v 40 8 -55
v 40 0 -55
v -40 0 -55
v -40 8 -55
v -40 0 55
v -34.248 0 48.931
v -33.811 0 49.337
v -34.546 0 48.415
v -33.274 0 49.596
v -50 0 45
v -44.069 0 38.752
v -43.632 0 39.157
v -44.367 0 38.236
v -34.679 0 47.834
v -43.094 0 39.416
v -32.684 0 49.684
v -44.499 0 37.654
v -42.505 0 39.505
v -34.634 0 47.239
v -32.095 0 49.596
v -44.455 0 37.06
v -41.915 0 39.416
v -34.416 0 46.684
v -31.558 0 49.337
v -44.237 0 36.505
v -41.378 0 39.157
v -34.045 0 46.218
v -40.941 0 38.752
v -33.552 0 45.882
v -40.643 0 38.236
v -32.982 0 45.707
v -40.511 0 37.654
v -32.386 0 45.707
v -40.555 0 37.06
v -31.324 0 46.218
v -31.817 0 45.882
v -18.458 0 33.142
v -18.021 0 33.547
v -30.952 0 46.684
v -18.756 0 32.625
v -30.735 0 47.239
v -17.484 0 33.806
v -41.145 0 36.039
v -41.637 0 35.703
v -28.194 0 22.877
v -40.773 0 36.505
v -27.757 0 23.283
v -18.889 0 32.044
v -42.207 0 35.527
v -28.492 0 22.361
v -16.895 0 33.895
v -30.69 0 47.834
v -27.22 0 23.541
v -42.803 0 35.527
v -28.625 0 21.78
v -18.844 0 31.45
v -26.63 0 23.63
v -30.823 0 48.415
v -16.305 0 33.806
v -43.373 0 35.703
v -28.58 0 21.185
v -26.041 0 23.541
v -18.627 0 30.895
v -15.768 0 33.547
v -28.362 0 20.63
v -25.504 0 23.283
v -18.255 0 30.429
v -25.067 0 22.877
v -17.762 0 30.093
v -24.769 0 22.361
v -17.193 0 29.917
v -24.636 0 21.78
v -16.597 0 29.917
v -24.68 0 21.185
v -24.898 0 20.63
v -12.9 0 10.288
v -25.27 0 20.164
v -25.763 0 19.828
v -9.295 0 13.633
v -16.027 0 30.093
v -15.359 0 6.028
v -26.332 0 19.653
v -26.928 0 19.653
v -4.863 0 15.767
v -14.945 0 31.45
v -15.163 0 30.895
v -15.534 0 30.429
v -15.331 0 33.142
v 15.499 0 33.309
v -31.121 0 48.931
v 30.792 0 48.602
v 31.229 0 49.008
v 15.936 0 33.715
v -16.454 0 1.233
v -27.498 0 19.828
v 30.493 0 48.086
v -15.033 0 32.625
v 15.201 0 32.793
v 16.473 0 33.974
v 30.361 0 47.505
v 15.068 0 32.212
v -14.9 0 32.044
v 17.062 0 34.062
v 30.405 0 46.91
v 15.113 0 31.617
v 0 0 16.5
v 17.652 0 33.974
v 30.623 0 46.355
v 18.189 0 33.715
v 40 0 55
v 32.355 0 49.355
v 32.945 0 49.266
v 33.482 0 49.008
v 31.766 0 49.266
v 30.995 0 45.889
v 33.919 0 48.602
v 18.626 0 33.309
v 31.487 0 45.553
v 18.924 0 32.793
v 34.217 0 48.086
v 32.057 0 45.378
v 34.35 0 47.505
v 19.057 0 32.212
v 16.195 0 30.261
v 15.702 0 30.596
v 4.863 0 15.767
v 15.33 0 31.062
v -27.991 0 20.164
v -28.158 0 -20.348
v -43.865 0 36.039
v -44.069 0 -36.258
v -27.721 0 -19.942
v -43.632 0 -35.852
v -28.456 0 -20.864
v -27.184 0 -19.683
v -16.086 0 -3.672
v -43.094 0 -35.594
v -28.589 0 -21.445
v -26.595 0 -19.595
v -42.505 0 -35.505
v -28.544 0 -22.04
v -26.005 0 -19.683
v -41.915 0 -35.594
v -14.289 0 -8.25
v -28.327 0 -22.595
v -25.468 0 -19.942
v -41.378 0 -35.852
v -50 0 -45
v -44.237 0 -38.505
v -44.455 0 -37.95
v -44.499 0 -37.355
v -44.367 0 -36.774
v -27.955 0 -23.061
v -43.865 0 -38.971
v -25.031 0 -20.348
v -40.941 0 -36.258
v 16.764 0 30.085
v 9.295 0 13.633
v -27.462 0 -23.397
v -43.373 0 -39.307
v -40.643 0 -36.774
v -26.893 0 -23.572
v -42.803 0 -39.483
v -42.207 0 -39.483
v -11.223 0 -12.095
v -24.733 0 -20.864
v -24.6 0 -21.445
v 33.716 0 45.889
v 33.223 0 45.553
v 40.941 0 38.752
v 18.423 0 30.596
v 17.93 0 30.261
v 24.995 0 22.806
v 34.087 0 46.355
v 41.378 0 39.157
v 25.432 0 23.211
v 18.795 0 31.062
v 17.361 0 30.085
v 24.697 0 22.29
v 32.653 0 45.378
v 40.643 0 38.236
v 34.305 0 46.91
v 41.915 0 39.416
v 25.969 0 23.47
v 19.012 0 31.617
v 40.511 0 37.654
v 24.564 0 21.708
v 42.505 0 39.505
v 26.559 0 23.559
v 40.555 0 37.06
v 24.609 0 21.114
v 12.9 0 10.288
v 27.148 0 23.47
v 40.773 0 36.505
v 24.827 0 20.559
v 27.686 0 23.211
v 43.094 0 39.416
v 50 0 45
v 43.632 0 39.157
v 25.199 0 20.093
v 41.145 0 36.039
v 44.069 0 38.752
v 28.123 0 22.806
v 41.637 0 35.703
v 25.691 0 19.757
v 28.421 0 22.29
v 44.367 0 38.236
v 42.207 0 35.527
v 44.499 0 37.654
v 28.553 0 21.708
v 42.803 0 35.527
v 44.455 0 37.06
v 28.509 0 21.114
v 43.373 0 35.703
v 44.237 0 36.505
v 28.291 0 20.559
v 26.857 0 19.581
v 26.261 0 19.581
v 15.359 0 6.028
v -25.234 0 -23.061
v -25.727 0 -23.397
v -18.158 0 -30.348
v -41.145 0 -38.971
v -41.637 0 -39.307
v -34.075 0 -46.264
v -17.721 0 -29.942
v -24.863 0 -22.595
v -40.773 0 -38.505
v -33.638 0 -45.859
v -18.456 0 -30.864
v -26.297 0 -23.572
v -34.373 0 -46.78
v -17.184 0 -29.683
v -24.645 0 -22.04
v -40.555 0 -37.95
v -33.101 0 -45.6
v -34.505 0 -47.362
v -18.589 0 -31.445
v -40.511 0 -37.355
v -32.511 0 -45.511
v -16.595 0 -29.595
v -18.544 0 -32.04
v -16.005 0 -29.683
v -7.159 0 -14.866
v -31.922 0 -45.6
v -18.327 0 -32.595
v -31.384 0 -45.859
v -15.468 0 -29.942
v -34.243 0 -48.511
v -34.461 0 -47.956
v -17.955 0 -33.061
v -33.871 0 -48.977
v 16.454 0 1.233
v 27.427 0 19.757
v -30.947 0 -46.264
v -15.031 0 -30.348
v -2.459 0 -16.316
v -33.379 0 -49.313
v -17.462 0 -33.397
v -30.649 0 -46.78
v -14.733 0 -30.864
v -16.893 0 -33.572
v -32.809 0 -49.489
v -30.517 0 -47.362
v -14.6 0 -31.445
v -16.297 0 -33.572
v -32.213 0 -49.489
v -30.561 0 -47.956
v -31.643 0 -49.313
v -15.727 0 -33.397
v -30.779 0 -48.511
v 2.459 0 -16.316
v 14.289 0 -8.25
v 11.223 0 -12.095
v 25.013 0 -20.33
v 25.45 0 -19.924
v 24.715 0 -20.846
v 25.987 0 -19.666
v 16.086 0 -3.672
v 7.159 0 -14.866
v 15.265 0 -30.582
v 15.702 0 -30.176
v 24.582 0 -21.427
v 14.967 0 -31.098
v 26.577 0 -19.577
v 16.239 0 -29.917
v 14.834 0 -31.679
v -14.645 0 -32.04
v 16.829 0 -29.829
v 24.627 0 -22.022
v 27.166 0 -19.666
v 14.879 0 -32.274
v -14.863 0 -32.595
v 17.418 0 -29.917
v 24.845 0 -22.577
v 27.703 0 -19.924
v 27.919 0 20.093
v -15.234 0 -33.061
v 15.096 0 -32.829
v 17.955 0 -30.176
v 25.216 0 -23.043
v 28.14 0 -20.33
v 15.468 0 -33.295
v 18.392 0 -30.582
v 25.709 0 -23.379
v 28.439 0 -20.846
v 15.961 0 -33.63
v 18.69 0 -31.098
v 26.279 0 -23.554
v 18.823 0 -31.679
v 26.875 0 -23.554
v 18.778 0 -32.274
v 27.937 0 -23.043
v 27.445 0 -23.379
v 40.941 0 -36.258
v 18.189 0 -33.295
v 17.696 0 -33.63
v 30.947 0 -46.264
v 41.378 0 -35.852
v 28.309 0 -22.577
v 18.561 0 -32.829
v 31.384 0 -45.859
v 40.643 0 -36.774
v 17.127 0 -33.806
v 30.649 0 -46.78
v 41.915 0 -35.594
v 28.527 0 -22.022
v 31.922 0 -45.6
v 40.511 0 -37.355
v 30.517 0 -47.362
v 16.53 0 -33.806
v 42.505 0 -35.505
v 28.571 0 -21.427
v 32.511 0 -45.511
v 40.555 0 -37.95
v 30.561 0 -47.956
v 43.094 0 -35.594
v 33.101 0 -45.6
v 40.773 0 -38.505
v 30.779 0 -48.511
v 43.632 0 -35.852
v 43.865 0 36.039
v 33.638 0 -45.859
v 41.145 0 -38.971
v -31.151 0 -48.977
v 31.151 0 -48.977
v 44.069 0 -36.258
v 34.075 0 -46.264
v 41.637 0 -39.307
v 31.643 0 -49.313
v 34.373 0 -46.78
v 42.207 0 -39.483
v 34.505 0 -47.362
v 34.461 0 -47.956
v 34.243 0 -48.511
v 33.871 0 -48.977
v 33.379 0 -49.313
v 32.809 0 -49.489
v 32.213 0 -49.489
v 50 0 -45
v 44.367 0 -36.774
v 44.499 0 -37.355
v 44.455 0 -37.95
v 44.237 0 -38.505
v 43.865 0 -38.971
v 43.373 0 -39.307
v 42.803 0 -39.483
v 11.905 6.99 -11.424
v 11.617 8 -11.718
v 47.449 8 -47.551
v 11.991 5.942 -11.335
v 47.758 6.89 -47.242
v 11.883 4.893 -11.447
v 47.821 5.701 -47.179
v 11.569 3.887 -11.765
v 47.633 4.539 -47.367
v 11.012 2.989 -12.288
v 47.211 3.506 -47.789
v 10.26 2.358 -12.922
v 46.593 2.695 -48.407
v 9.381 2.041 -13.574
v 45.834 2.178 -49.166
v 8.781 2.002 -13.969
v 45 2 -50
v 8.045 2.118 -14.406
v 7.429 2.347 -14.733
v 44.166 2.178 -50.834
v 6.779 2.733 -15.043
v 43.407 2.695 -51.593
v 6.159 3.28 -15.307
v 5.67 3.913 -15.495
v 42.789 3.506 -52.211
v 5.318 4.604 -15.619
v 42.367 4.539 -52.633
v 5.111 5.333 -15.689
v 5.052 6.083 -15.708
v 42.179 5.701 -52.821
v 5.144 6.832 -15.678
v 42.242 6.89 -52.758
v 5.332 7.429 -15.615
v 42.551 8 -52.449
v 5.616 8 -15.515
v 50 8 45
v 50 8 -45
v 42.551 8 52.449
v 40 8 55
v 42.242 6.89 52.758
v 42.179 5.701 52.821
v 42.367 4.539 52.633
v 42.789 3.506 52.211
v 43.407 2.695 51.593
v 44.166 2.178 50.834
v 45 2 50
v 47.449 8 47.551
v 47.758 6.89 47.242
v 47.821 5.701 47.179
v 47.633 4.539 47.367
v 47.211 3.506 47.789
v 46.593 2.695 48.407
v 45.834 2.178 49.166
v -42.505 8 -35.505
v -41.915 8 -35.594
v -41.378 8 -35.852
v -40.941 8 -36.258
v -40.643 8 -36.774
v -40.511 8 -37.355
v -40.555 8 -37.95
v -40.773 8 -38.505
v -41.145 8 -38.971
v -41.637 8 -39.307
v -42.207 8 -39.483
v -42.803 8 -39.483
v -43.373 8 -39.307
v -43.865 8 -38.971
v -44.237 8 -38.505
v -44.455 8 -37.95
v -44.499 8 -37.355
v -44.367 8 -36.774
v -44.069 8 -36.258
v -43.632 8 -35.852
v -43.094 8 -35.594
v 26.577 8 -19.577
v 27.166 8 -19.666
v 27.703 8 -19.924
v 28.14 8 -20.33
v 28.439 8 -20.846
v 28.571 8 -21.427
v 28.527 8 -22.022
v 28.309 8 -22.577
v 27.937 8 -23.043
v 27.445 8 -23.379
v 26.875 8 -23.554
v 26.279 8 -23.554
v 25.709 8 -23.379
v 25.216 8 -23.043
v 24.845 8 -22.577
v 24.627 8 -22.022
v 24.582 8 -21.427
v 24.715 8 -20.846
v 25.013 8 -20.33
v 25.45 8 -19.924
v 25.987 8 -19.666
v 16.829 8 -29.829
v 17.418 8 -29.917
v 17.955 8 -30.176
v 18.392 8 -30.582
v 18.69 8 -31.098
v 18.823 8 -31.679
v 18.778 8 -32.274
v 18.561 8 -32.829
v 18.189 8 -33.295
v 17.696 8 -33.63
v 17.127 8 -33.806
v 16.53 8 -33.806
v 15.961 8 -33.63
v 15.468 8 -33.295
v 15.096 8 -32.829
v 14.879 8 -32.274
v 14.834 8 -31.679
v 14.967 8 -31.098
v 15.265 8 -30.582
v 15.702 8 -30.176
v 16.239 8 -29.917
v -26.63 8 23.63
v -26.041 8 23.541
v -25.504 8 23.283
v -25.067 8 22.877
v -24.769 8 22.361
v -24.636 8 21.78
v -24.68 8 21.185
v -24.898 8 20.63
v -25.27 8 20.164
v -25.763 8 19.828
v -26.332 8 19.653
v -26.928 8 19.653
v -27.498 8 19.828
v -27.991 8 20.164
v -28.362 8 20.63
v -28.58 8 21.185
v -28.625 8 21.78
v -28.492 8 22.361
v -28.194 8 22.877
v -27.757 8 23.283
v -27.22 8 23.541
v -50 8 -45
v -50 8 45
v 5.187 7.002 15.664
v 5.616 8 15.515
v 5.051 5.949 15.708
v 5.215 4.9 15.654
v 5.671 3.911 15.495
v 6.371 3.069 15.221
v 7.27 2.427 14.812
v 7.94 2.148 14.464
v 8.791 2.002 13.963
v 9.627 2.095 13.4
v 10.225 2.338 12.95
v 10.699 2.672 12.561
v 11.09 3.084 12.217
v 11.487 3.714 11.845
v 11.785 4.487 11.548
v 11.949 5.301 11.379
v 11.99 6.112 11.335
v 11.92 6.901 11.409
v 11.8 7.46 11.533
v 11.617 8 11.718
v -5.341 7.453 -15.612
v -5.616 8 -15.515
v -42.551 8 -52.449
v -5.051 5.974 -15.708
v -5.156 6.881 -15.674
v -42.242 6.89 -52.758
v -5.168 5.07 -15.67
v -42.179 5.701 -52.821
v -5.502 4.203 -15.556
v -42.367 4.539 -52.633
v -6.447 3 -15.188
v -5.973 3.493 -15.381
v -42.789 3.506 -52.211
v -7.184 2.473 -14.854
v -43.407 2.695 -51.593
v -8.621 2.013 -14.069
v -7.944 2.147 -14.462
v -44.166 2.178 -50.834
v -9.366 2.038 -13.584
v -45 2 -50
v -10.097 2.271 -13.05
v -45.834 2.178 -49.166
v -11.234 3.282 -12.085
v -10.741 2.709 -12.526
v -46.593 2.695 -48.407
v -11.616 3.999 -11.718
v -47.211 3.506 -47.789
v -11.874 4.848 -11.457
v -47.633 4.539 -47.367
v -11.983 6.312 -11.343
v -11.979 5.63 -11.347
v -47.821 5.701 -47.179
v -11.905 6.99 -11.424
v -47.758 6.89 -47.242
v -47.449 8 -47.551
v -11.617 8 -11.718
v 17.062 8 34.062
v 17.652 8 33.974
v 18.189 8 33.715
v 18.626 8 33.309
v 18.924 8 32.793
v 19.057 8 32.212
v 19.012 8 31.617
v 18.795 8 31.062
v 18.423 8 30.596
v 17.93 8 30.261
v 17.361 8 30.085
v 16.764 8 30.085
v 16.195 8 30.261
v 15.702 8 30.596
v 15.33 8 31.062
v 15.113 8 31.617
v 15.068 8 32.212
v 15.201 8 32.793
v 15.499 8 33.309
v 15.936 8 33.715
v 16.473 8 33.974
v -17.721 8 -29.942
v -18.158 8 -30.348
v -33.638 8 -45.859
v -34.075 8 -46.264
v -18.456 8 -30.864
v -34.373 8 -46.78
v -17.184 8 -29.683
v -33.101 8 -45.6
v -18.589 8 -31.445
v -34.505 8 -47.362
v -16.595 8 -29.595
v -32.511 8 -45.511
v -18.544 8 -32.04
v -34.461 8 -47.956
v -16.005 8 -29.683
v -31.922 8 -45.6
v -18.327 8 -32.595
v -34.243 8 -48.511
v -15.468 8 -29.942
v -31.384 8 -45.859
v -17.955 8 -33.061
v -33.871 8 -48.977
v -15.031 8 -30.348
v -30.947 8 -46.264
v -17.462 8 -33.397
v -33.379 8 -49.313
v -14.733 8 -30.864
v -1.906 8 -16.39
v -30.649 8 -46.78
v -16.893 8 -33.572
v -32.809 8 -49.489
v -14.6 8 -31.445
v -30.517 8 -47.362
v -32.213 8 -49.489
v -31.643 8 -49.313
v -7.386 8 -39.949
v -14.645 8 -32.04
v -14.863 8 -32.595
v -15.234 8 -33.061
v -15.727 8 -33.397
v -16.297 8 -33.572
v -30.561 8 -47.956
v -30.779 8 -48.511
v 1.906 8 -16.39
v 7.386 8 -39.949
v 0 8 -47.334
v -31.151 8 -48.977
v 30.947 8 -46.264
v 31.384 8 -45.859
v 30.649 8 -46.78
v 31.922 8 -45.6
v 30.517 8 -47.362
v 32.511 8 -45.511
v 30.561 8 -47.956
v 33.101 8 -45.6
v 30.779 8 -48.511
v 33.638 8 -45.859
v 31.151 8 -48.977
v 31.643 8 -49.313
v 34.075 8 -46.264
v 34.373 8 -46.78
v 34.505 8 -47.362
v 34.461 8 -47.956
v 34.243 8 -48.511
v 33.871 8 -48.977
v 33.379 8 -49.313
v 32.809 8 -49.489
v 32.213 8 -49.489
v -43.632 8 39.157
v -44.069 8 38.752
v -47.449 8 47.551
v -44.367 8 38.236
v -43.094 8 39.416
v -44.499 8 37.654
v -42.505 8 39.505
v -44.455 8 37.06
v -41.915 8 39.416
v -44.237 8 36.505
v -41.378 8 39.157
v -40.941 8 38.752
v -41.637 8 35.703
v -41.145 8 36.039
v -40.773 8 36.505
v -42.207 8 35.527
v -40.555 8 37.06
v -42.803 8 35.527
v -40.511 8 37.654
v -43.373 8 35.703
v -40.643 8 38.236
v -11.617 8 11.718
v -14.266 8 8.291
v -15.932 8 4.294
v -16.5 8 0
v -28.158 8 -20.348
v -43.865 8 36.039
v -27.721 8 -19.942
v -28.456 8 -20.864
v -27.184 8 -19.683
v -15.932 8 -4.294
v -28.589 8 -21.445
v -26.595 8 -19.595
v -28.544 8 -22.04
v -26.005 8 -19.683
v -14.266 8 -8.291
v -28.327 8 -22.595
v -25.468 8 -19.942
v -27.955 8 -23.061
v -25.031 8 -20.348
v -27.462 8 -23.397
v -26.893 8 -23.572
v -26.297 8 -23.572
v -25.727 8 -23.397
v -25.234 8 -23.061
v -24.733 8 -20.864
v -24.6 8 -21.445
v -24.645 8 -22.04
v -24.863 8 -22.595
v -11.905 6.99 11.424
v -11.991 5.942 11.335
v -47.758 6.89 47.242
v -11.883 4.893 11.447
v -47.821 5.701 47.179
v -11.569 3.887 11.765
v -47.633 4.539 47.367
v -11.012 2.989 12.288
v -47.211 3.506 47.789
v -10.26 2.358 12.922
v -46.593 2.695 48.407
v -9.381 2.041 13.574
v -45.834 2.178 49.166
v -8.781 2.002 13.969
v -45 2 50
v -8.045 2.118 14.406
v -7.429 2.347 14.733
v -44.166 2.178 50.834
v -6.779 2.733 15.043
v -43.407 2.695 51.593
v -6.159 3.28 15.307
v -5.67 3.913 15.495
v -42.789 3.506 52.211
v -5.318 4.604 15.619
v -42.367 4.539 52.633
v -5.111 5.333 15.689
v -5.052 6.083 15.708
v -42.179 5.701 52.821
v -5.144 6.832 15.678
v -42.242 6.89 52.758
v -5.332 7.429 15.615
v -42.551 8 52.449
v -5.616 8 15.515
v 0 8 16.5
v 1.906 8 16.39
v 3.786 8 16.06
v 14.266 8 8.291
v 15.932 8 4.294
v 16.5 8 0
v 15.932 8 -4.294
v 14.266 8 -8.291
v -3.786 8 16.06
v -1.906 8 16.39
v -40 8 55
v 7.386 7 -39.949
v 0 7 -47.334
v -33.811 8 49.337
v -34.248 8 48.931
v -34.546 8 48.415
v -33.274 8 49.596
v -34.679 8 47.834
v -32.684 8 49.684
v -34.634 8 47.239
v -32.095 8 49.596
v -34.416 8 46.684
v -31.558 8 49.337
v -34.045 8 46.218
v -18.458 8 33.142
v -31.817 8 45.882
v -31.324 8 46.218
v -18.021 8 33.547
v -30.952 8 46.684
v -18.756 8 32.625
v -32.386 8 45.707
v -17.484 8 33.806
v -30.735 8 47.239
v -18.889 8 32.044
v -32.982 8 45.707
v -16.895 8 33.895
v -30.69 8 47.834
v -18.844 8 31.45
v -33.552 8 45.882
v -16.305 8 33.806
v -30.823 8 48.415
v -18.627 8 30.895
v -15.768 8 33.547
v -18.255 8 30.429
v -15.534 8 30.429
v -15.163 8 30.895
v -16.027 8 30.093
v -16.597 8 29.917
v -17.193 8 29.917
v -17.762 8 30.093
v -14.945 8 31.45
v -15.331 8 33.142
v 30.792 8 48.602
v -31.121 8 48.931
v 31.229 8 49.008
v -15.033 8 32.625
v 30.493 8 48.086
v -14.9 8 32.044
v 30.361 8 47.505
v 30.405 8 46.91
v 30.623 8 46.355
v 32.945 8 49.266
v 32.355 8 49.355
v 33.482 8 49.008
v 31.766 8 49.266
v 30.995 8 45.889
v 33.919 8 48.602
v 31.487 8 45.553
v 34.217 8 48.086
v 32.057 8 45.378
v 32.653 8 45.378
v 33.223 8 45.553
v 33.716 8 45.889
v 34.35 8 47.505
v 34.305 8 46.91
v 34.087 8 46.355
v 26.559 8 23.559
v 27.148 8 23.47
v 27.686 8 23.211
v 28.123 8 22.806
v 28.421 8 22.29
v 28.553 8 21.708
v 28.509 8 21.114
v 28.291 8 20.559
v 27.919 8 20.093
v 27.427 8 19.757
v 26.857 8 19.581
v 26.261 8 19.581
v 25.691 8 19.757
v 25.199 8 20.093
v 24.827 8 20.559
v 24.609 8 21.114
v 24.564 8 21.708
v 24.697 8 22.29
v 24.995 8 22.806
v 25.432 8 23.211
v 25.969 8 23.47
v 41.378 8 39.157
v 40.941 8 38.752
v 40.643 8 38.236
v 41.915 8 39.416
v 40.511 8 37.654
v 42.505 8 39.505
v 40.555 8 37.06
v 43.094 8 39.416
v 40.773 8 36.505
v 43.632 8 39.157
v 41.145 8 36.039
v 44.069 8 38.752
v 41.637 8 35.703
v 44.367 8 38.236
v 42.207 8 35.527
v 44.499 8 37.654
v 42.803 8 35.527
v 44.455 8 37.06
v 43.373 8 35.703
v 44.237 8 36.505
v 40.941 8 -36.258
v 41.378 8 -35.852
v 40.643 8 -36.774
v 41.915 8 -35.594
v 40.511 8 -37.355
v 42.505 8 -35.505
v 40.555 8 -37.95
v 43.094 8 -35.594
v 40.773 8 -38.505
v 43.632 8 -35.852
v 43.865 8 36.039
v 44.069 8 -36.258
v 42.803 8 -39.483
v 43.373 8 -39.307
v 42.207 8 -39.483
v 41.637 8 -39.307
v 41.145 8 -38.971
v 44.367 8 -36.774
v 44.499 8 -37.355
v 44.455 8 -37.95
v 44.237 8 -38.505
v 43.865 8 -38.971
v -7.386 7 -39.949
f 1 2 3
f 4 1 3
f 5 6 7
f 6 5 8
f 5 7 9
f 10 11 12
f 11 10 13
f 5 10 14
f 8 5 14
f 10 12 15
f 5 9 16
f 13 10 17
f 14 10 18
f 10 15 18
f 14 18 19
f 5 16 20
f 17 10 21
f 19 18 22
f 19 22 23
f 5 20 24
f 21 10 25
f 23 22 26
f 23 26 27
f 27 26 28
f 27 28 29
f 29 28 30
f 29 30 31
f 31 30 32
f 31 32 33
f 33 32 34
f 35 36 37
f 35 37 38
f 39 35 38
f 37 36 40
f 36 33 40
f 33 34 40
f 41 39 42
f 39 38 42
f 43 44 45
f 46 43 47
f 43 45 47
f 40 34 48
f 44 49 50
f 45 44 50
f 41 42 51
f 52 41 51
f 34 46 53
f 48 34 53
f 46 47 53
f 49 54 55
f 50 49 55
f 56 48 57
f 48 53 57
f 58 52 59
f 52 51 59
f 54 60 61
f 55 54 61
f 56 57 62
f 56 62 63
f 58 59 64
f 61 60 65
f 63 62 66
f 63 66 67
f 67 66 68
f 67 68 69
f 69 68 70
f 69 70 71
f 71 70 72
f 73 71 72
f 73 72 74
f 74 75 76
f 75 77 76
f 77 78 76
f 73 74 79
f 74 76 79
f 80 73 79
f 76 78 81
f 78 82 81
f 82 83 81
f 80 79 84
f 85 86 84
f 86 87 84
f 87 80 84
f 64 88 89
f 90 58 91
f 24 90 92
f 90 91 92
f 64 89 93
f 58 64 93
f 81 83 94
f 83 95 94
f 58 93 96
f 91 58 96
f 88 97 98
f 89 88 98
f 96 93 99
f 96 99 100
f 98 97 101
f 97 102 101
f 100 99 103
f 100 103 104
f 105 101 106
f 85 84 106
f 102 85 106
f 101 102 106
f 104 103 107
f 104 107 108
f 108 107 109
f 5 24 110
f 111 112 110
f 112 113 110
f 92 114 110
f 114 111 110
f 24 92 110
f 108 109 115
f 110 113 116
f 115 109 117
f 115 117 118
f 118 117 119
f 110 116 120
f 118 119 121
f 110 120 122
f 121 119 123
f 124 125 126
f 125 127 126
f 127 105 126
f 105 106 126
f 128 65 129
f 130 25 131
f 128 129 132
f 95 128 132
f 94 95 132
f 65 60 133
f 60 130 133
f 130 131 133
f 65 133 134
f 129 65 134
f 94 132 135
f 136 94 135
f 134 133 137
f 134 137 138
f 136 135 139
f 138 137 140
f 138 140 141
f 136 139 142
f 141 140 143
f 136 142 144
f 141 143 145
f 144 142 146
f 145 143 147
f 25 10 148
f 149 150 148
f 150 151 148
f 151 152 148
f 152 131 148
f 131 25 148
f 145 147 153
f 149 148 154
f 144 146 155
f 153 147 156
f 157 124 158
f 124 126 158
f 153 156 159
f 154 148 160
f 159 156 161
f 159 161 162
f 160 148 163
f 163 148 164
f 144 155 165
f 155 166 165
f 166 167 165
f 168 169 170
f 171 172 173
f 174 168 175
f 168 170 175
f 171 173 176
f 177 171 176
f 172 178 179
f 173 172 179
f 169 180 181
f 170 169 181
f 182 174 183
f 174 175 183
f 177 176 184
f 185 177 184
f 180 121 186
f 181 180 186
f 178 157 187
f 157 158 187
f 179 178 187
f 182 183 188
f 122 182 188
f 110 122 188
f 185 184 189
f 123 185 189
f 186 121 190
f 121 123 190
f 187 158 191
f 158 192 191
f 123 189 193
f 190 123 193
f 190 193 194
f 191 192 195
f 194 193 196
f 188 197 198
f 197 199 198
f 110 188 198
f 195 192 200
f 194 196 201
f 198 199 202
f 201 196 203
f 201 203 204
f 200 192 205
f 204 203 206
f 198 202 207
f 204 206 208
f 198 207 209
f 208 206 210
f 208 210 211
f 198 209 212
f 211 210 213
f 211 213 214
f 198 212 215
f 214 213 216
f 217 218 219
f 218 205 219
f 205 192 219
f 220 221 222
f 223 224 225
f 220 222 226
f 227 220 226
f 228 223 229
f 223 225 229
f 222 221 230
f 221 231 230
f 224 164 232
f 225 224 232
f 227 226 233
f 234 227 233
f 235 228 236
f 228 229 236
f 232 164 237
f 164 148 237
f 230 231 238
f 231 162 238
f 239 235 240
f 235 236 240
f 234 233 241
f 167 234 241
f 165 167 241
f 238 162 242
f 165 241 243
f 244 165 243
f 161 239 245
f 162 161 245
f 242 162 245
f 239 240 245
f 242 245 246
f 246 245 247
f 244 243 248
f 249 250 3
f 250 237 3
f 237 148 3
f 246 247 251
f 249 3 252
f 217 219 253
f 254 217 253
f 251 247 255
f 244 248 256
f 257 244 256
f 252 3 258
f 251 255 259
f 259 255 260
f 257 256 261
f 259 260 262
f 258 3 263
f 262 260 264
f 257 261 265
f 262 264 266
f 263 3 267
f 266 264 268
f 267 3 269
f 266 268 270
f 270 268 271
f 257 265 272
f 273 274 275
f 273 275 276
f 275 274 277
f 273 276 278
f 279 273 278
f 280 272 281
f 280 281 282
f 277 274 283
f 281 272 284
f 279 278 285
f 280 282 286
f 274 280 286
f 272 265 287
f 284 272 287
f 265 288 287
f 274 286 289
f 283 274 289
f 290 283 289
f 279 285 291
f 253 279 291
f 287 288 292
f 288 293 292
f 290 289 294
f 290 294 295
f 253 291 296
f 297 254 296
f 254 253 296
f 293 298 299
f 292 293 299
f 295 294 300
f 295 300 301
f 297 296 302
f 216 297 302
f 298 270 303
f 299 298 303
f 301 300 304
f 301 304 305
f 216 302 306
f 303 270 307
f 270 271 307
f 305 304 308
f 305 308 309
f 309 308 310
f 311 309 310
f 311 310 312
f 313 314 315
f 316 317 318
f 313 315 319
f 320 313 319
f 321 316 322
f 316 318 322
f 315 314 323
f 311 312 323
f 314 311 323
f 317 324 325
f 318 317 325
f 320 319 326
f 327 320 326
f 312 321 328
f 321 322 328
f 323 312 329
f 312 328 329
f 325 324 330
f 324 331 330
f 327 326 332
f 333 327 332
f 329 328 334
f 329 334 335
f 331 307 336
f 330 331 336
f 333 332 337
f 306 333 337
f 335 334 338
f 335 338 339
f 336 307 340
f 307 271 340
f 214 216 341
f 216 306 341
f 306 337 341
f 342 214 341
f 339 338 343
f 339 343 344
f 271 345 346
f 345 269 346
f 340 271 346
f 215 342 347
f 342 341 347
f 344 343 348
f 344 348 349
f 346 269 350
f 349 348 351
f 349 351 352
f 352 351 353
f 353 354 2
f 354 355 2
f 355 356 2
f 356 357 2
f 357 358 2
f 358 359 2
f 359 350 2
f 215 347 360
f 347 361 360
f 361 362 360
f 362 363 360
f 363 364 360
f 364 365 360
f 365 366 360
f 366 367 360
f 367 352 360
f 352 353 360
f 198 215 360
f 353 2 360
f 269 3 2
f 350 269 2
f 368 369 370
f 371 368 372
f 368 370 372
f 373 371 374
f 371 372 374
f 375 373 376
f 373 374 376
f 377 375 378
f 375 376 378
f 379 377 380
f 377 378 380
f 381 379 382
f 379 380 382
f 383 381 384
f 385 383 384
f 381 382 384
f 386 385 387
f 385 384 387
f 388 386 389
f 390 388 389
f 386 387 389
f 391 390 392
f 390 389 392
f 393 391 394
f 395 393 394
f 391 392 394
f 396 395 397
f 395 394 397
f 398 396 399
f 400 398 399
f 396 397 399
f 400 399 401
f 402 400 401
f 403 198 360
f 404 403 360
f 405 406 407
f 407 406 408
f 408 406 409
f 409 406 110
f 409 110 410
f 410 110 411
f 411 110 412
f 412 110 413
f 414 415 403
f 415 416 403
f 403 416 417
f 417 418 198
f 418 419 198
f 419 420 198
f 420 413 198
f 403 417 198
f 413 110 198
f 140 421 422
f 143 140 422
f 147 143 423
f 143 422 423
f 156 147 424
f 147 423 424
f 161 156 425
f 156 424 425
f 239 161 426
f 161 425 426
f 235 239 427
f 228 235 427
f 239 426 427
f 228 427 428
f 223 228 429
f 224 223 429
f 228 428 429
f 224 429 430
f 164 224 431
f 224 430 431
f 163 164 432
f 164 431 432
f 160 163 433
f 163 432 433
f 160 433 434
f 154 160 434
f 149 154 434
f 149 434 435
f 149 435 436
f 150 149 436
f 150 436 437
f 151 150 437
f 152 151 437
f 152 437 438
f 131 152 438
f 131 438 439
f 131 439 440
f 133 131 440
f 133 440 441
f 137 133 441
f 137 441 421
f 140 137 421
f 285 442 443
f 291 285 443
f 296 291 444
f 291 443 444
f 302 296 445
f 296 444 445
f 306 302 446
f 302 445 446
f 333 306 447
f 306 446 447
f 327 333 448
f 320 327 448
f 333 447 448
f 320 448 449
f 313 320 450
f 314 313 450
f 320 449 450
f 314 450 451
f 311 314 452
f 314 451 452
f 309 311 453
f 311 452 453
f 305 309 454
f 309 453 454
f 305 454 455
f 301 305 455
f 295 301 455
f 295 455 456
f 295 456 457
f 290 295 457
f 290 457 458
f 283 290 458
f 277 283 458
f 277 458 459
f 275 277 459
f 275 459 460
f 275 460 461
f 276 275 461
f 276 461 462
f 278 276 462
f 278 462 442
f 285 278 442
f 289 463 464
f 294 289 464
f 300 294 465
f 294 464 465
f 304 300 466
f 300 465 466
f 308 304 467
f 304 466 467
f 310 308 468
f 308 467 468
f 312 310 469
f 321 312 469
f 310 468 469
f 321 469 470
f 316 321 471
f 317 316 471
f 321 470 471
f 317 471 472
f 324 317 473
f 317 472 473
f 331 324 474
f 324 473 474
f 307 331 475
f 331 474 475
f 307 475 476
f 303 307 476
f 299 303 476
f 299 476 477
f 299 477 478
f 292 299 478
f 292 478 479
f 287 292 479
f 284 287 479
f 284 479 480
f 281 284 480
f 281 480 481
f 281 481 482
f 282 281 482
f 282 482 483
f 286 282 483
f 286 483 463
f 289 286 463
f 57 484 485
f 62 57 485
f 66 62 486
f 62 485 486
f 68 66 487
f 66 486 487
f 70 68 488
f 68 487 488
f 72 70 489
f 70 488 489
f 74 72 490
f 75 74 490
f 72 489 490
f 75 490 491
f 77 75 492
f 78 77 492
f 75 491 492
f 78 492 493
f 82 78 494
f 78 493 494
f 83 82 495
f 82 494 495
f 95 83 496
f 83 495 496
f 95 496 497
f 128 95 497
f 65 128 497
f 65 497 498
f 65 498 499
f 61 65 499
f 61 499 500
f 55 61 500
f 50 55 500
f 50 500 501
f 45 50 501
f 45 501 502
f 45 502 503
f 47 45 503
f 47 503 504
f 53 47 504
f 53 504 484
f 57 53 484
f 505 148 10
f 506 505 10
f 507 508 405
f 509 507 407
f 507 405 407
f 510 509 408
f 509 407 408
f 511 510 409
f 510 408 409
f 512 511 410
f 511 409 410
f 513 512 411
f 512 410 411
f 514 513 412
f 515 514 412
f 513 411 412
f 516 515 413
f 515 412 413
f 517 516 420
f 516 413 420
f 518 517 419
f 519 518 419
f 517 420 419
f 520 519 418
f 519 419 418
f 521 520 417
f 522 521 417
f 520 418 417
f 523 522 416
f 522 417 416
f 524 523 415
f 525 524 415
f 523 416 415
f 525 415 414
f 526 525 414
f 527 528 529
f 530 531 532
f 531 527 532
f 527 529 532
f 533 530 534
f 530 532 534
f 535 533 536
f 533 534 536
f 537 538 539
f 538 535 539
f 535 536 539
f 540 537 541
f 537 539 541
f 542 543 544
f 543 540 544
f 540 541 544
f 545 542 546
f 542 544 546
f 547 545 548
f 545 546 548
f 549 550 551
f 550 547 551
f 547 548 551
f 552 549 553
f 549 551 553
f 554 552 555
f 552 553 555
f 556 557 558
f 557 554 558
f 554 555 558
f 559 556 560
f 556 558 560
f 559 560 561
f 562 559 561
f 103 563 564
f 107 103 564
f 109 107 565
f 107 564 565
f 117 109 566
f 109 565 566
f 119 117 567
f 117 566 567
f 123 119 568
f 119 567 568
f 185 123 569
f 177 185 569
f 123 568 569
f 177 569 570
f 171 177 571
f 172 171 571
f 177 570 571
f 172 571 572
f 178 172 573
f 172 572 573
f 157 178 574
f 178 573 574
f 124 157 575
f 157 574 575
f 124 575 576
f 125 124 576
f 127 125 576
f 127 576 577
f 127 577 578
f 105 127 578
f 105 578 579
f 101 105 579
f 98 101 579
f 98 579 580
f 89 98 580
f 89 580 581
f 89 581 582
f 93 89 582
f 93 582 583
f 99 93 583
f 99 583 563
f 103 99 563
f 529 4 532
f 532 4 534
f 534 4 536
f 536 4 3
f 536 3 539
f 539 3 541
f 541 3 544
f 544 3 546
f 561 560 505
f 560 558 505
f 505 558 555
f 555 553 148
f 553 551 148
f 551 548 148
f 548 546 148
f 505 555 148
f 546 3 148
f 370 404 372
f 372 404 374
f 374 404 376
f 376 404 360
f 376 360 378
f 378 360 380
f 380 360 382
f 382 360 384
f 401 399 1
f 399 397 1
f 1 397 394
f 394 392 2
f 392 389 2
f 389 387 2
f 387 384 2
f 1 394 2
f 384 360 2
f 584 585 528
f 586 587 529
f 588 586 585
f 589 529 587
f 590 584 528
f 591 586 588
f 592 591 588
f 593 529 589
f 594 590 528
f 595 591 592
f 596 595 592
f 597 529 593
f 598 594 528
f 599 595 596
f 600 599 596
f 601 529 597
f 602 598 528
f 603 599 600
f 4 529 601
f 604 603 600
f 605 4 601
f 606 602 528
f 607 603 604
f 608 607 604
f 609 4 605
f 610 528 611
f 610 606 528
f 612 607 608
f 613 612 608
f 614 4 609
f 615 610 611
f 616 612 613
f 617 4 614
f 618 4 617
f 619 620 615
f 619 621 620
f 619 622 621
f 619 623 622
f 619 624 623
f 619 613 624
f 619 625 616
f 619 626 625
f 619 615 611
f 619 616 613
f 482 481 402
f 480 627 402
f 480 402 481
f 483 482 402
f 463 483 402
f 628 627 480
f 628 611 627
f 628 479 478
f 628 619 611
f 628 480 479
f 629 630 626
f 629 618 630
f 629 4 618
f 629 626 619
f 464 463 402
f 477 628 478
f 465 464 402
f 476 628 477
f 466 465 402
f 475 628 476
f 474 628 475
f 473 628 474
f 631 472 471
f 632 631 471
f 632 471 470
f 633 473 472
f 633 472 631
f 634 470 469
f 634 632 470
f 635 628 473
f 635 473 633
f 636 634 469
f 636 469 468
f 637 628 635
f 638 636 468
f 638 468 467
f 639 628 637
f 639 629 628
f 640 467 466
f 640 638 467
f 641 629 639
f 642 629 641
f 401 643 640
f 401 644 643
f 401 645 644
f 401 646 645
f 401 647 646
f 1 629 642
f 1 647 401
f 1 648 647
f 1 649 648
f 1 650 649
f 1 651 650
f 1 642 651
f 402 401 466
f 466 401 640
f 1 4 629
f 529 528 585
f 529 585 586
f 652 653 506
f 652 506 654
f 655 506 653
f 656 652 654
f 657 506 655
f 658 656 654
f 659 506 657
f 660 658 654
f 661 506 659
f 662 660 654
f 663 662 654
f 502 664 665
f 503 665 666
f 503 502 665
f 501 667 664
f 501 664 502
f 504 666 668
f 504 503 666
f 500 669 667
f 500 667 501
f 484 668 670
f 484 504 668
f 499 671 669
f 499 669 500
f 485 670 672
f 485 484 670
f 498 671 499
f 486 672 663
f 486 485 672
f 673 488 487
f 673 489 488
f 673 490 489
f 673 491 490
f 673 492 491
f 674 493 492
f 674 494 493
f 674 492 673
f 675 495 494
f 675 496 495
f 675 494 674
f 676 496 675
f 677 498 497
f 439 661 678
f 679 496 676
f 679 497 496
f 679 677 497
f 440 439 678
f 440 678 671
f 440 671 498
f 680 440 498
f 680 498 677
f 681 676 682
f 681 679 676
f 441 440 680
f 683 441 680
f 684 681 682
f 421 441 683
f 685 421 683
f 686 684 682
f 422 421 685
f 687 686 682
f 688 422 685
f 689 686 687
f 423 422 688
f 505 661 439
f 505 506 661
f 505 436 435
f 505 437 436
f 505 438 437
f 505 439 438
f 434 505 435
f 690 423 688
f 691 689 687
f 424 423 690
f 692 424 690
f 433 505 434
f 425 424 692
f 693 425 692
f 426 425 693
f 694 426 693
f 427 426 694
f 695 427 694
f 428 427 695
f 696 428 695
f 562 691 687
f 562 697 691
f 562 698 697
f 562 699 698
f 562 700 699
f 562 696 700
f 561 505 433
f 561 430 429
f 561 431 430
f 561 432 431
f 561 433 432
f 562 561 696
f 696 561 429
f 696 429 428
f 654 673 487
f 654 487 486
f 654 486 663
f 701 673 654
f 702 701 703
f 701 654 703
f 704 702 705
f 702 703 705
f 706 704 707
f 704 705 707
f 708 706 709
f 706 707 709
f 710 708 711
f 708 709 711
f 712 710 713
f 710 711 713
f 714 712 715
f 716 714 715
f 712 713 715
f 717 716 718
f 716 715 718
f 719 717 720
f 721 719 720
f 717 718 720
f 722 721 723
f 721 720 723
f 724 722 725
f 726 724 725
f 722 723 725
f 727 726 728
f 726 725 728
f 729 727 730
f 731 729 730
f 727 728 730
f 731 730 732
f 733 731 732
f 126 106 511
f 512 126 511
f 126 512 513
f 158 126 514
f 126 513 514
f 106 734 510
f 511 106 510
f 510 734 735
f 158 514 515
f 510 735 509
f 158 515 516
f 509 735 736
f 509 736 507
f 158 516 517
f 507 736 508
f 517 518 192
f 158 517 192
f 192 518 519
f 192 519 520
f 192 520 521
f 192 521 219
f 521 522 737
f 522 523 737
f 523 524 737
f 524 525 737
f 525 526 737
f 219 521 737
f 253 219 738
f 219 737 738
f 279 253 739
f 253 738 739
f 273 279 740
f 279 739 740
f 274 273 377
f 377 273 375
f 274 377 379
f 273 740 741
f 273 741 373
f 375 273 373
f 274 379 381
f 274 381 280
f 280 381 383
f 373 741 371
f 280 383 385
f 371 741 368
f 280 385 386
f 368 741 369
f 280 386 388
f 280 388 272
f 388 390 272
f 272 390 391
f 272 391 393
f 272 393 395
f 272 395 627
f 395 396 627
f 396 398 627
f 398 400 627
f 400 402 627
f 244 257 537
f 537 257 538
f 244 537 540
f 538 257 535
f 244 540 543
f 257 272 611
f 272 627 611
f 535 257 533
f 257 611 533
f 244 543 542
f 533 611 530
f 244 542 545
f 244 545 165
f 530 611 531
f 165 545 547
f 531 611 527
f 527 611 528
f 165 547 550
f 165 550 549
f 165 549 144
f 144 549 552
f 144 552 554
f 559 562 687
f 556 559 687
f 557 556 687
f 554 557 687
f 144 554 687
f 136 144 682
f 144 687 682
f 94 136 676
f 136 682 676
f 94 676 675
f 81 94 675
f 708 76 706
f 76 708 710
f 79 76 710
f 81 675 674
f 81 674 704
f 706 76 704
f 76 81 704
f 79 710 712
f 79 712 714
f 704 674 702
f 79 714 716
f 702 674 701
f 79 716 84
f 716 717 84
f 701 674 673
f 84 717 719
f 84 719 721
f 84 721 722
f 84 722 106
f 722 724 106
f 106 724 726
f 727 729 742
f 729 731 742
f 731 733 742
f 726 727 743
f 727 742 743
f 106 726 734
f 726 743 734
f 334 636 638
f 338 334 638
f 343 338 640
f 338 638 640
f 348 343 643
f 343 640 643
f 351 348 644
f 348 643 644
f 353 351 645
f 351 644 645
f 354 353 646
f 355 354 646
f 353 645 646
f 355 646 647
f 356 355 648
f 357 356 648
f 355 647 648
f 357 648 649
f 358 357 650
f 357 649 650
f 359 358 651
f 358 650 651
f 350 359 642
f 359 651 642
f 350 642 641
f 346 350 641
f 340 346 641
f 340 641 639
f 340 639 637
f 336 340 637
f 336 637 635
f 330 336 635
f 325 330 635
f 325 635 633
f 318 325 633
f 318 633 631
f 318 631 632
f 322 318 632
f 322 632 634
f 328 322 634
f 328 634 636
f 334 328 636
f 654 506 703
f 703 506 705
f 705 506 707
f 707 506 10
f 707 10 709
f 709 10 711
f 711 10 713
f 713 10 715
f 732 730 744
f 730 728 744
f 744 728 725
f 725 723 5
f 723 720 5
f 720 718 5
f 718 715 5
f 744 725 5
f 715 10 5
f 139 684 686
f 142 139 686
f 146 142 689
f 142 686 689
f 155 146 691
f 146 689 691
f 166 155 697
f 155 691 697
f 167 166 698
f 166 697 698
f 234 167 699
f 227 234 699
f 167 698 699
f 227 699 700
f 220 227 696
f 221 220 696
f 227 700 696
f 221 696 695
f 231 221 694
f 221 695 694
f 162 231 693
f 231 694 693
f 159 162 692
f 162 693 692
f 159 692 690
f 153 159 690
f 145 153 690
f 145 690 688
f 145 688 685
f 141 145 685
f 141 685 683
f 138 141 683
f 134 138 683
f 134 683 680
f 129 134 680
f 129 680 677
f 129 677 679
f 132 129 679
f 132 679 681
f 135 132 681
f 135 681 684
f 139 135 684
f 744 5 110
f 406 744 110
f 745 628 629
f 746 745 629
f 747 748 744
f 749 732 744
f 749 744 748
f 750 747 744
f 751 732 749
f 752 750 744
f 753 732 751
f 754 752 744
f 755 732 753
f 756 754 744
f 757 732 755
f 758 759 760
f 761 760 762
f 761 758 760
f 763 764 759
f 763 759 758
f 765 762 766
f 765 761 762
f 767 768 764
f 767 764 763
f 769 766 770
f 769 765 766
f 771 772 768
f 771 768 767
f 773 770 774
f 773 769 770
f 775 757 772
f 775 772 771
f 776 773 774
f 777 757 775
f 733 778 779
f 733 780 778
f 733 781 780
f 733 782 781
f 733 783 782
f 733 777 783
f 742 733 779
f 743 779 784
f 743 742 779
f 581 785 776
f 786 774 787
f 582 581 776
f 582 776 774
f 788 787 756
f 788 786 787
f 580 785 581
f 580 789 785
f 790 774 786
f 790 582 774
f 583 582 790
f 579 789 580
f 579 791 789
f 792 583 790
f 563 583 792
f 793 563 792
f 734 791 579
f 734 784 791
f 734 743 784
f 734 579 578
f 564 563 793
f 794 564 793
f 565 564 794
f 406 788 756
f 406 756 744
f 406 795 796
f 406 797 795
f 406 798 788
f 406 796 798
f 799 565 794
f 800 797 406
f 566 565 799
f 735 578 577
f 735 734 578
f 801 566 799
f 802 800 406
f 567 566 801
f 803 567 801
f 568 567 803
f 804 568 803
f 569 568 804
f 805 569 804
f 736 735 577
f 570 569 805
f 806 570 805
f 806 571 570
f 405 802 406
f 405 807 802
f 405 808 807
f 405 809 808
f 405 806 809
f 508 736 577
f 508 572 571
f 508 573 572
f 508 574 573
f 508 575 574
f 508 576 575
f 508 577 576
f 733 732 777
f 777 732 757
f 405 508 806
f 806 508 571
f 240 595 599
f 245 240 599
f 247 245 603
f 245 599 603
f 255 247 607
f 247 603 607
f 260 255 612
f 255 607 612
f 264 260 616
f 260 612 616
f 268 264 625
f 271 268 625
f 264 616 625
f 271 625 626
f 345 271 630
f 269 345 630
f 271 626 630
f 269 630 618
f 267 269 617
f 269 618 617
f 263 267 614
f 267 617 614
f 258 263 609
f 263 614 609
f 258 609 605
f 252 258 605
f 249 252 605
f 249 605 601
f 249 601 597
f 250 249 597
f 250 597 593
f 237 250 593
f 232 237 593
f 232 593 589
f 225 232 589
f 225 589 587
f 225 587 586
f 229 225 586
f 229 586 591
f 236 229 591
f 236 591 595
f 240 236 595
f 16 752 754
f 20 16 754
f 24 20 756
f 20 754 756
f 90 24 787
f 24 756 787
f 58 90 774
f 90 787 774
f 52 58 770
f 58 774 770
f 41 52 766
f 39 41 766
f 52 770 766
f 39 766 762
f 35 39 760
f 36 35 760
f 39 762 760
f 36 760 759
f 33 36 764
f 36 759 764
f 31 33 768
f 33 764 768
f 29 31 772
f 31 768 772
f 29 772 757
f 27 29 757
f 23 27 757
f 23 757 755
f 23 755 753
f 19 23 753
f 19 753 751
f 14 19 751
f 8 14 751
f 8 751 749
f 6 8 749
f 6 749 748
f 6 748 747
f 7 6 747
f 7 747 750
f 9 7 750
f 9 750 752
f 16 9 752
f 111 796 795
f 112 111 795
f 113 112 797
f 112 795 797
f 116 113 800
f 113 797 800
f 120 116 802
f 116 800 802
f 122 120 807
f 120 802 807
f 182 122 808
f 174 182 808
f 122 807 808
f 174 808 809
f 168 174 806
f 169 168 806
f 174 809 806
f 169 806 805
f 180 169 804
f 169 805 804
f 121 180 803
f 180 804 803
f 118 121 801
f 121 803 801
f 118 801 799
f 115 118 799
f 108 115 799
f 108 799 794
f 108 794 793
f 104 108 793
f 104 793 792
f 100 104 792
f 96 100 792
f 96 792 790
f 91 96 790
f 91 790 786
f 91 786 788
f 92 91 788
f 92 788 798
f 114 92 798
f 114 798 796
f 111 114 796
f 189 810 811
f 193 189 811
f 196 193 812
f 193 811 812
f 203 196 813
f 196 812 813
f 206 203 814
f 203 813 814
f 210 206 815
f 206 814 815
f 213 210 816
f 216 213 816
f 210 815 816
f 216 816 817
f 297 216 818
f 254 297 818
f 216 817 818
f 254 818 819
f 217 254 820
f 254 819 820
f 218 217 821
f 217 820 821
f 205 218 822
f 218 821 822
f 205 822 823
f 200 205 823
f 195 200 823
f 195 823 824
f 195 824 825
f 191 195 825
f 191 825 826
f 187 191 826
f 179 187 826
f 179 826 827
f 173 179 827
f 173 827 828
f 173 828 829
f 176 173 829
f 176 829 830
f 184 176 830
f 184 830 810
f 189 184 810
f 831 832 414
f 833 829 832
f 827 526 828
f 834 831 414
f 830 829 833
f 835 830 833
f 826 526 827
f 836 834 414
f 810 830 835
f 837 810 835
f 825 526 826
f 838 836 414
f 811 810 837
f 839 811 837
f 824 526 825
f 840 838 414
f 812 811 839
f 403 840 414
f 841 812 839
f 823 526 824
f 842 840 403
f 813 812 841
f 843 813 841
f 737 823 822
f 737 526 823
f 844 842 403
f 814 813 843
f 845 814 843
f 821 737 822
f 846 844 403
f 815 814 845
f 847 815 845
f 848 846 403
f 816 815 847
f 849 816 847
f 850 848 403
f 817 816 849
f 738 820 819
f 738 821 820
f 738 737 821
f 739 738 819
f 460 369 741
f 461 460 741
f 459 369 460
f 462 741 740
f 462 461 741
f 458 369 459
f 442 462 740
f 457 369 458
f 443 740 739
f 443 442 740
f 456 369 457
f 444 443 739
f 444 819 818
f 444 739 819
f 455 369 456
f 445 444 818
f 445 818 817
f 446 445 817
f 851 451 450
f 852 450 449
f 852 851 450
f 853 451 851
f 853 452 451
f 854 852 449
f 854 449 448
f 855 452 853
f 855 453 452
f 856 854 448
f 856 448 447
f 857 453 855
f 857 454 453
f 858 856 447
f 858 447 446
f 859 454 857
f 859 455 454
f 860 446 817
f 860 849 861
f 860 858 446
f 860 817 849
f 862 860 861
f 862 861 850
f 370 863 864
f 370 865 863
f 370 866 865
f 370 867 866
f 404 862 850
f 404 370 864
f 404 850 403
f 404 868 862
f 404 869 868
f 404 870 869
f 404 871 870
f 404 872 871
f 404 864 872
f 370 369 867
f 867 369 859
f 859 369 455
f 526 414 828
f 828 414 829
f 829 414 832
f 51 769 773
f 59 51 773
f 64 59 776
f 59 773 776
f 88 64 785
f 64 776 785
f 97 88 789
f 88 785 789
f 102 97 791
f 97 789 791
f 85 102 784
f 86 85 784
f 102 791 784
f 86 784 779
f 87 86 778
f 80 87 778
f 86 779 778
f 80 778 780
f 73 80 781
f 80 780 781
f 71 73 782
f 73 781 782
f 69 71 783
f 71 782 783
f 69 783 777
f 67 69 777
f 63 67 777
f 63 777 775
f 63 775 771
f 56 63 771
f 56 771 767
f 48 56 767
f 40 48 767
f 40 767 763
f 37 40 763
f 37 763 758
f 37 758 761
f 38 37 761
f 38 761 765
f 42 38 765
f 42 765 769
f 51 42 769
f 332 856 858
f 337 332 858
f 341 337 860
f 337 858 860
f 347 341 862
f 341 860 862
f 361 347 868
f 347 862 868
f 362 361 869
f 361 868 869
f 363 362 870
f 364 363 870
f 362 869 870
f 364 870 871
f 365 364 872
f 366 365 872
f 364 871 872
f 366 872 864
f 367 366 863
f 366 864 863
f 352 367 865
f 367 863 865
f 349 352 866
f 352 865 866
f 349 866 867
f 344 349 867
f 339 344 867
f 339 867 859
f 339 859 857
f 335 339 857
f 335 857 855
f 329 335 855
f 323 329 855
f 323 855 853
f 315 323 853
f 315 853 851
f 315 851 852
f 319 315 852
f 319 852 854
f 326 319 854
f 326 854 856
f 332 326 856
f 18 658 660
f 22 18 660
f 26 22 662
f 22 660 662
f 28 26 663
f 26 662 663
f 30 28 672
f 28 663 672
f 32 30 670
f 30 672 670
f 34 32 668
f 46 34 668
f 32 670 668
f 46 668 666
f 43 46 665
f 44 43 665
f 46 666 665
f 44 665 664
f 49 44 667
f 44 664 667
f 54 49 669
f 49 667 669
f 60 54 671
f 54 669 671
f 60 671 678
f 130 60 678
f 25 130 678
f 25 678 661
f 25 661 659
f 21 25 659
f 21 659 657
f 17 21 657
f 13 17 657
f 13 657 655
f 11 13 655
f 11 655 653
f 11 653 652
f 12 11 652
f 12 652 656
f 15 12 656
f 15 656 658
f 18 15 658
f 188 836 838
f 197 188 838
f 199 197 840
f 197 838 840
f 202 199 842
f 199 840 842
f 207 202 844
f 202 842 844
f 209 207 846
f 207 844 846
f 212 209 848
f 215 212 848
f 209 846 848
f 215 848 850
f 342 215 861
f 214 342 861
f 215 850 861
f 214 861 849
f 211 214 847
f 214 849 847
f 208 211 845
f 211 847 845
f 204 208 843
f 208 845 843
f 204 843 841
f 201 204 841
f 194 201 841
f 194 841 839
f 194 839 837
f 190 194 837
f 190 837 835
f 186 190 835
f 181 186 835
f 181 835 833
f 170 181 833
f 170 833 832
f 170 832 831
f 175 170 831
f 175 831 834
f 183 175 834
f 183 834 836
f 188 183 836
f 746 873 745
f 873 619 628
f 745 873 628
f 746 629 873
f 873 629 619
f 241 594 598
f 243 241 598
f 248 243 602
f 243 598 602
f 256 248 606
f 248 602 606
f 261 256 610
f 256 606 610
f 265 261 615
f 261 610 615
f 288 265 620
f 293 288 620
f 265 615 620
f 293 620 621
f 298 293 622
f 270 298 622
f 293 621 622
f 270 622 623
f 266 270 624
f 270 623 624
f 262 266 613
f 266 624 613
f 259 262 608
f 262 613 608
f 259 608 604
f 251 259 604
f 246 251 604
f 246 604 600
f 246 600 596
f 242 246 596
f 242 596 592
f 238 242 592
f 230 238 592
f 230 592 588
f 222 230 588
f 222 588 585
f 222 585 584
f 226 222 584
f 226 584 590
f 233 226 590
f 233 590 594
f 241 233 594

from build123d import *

# Parameters (mm, degrees)
EXTRUDE_1_DEPTH     = 8
SKETCH_3_R          = 16.5
CUT_EXTRUDE_1_DEPTH = 8
SKETCH_2_R          = 4
CUT_EXTRUDE_2_DEPTH = 60
SKETCH_4_R          = 4
CUT_EXTRUDE_3_DEPTH = 60
SKETCH_5_R          = 4
CUT_EXTRUDE_4_DEPTH = 60
SKETCH_6_R          = 4
CUT_EXTRUDE_5_DEPTH = 60
CUT_EXTRUDE_6_DEPTH = 1
SKETCH_8_R          = 2
CUT_EXTRUDE_8_DEPTH = 9


with BuildPart() as part:
    # 草图1 → 凸台-拉伸1 (new body)
    with BuildSketch(Plane(origin=(0, 0, 0), x_dir=(1, 0, 0), z_dir=(0, 1, 0))):
        Polygon((-40, 55), (-50, 45), (-50, -45), (-40, -55), (40, -55), (50, -45), (50, 45), (40, 55), align=None)
    extrude(amount=EXTRUDE_1_DEPTH)

    # 草图3 → 切除-拉伸1 (cut)
    with BuildSketch(Plane(origin=(0, 8, 0), x_dir=(1, 0, 0), z_dir=(0, 1, 0))):
        with Locations(Location((0, 0, 0), (0, 0, 270))):
            Circle(SKETCH_3_R)
    extrude(amount=-CUT_EXTRUDE_1_DEPTH, mode=Mode.SUBTRACT)

    # 草图2 → 切除-拉伸2 (cut)
    with BuildSketch(Plane(origin=(47.5, 0, 47.5), x_dir=(0.7071067811865483, 0, -0.7071067811865468), z_dir=(0.7071067811865468, 0, 0.7071067811865483))):
        with Locations((-3.535533906, 6)):
            Circle(SKETCH_2_R)
    extrude(amount=-CUT_EXTRUDE_2_DEPTH, mode=Mode.SUBTRACT)

    # 草图4 → 切除-拉伸3 (cut)
    with BuildSketch(Plane(origin=(-47.5, 0, 47.5), x_dir=(0.7071067811865475, 0, 0.7071067811865477), z_dir=(-0.7071067811865477, 0, 0.7071067811865475))):
        with Locations((3.535533906, 6)):
            Circle(SKETCH_4_R)
    extrude(amount=-CUT_EXTRUDE_3_DEPTH, mode=Mode.SUBTRACT)

    # 草图5 → 切除-拉伸4 (cut)
    with BuildSketch(Plane(origin=(-47.5, 0, -47.5), x_dir=(-0.7071067811865477, 0, 0.7071067811865475), z_dir=(-0.7071067811865475, 0, -0.7071067811865477))):
        with Locations((-3.535533906, 6)):
            Circle(SKETCH_5_R)
    extrude(amount=-CUT_EXTRUDE_4_DEPTH, mode=Mode.SUBTRACT)

    # 草图6 → 切除-拉伸5 (cut)
    with BuildSketch(Plane(origin=(47.5, 0, -47.5), x_dir=(-0.7071067811865475, 0, -0.7071067811865477), z_dir=(0.7071067811865477, 0, -0.7071067811865475))):
        with Locations((3.535533906, 6)):
            Circle(SKETCH_6_R)
    extrude(amount=-CUT_EXTRUDE_5_DEPTH, mode=Mode.SUBTRACT)

    # 草图7 → 切除-拉伸6 (cut)
    with BuildSketch(Plane(origin=(0, 8, 0), x_dir=(1, 0, 0), z_dir=(0, 1, 0))):
        Polygon((0, 47.334494774), (-7.385524007, 39.948970766), (7.385524007, 39.948970766), align=None)
    extrude(amount=-CUT_EXTRUDE_6_DEPTH, mode=Mode.SUBTRACT)

    # 草图8 → 切除-拉伸8 (cut)
    with BuildSketch(Plane(origin=(0, 8, 0), x_dir=(1, 0, 0), z_dir=(0, 1, 0))):
        with Locations(Location((-32.511046196, 47.511046196, 0), (0, 0, 270))):
            Circle(SKETCH_8_R)
        with Locations(Location((-42.504921706, 37.504921706, 0), (0, 0, 270))):
            Circle(SKETCH_8_R)
        with Locations(Location((-16.594623736, 31.594623736, 0), (0, 0, 270))):
            Circle(SKETCH_8_R)
        with Locations(Location((-26.594623736, 21.594623736, 0), (0, 0, 270))):
            Circle(SKETCH_8_R)
        with Locations(Location((16.828543077, 31.828543077, 0), (0, 0, 270))):
            Circle(SKETCH_8_R)
        with Locations(Location((32.511046196, 47.511046196, 0), (0, 0, 270))):
            Circle(SKETCH_8_R)
        with Locations(Location((42.504921706, 37.504921706, 0), (0, 0, 270))):
            Circle(SKETCH_8_R)
        with Locations(Location((26.57676385, 21.57676385, 0), (0, 0, 270))):
            Circle(SKETCH_8_R)
        with Locations(Location((-26.63034351, -21.63034351, 0), (0, 0, 270))):
            Circle(SKETCH_8_R)
        with Locations(Location((-16.8946096, -31.8946096, 0), (0, 0, 270))):
            Circle(SKETCH_8_R)
        with Locations(Location((-42.504921706, -37.504921706, 0), (0, 0, 270))):
            Circle(SKETCH_8_R)
        with Locations(Location((-32.684358037, -47.684358037, 0), (0, 0, 270))):
            Circle(SKETCH_8_R)
        with Locations(Location((26.558903963, -21.558903963, 0), (0, 0, 270))):
            Circle(SKETCH_8_R)
        with Locations(Location((17.062462418, -32.062462418, 0), (0, 0, 270))):
            Circle(SKETCH_8_R)
        with Locations(Location((42.504921706, -37.504921706, 0), (0, 0, 270))):
            Circle(SKETCH_8_R)
        with Locations(Location((32.355177206, -47.355177206, 0), (0, 0, 270))):
            Circle(SKETCH_8_R)
    extrude(amount=-CUT_EXTRUDE_8_DEPTH, mode=Mode.SUBTRACT)


solid = part.part
